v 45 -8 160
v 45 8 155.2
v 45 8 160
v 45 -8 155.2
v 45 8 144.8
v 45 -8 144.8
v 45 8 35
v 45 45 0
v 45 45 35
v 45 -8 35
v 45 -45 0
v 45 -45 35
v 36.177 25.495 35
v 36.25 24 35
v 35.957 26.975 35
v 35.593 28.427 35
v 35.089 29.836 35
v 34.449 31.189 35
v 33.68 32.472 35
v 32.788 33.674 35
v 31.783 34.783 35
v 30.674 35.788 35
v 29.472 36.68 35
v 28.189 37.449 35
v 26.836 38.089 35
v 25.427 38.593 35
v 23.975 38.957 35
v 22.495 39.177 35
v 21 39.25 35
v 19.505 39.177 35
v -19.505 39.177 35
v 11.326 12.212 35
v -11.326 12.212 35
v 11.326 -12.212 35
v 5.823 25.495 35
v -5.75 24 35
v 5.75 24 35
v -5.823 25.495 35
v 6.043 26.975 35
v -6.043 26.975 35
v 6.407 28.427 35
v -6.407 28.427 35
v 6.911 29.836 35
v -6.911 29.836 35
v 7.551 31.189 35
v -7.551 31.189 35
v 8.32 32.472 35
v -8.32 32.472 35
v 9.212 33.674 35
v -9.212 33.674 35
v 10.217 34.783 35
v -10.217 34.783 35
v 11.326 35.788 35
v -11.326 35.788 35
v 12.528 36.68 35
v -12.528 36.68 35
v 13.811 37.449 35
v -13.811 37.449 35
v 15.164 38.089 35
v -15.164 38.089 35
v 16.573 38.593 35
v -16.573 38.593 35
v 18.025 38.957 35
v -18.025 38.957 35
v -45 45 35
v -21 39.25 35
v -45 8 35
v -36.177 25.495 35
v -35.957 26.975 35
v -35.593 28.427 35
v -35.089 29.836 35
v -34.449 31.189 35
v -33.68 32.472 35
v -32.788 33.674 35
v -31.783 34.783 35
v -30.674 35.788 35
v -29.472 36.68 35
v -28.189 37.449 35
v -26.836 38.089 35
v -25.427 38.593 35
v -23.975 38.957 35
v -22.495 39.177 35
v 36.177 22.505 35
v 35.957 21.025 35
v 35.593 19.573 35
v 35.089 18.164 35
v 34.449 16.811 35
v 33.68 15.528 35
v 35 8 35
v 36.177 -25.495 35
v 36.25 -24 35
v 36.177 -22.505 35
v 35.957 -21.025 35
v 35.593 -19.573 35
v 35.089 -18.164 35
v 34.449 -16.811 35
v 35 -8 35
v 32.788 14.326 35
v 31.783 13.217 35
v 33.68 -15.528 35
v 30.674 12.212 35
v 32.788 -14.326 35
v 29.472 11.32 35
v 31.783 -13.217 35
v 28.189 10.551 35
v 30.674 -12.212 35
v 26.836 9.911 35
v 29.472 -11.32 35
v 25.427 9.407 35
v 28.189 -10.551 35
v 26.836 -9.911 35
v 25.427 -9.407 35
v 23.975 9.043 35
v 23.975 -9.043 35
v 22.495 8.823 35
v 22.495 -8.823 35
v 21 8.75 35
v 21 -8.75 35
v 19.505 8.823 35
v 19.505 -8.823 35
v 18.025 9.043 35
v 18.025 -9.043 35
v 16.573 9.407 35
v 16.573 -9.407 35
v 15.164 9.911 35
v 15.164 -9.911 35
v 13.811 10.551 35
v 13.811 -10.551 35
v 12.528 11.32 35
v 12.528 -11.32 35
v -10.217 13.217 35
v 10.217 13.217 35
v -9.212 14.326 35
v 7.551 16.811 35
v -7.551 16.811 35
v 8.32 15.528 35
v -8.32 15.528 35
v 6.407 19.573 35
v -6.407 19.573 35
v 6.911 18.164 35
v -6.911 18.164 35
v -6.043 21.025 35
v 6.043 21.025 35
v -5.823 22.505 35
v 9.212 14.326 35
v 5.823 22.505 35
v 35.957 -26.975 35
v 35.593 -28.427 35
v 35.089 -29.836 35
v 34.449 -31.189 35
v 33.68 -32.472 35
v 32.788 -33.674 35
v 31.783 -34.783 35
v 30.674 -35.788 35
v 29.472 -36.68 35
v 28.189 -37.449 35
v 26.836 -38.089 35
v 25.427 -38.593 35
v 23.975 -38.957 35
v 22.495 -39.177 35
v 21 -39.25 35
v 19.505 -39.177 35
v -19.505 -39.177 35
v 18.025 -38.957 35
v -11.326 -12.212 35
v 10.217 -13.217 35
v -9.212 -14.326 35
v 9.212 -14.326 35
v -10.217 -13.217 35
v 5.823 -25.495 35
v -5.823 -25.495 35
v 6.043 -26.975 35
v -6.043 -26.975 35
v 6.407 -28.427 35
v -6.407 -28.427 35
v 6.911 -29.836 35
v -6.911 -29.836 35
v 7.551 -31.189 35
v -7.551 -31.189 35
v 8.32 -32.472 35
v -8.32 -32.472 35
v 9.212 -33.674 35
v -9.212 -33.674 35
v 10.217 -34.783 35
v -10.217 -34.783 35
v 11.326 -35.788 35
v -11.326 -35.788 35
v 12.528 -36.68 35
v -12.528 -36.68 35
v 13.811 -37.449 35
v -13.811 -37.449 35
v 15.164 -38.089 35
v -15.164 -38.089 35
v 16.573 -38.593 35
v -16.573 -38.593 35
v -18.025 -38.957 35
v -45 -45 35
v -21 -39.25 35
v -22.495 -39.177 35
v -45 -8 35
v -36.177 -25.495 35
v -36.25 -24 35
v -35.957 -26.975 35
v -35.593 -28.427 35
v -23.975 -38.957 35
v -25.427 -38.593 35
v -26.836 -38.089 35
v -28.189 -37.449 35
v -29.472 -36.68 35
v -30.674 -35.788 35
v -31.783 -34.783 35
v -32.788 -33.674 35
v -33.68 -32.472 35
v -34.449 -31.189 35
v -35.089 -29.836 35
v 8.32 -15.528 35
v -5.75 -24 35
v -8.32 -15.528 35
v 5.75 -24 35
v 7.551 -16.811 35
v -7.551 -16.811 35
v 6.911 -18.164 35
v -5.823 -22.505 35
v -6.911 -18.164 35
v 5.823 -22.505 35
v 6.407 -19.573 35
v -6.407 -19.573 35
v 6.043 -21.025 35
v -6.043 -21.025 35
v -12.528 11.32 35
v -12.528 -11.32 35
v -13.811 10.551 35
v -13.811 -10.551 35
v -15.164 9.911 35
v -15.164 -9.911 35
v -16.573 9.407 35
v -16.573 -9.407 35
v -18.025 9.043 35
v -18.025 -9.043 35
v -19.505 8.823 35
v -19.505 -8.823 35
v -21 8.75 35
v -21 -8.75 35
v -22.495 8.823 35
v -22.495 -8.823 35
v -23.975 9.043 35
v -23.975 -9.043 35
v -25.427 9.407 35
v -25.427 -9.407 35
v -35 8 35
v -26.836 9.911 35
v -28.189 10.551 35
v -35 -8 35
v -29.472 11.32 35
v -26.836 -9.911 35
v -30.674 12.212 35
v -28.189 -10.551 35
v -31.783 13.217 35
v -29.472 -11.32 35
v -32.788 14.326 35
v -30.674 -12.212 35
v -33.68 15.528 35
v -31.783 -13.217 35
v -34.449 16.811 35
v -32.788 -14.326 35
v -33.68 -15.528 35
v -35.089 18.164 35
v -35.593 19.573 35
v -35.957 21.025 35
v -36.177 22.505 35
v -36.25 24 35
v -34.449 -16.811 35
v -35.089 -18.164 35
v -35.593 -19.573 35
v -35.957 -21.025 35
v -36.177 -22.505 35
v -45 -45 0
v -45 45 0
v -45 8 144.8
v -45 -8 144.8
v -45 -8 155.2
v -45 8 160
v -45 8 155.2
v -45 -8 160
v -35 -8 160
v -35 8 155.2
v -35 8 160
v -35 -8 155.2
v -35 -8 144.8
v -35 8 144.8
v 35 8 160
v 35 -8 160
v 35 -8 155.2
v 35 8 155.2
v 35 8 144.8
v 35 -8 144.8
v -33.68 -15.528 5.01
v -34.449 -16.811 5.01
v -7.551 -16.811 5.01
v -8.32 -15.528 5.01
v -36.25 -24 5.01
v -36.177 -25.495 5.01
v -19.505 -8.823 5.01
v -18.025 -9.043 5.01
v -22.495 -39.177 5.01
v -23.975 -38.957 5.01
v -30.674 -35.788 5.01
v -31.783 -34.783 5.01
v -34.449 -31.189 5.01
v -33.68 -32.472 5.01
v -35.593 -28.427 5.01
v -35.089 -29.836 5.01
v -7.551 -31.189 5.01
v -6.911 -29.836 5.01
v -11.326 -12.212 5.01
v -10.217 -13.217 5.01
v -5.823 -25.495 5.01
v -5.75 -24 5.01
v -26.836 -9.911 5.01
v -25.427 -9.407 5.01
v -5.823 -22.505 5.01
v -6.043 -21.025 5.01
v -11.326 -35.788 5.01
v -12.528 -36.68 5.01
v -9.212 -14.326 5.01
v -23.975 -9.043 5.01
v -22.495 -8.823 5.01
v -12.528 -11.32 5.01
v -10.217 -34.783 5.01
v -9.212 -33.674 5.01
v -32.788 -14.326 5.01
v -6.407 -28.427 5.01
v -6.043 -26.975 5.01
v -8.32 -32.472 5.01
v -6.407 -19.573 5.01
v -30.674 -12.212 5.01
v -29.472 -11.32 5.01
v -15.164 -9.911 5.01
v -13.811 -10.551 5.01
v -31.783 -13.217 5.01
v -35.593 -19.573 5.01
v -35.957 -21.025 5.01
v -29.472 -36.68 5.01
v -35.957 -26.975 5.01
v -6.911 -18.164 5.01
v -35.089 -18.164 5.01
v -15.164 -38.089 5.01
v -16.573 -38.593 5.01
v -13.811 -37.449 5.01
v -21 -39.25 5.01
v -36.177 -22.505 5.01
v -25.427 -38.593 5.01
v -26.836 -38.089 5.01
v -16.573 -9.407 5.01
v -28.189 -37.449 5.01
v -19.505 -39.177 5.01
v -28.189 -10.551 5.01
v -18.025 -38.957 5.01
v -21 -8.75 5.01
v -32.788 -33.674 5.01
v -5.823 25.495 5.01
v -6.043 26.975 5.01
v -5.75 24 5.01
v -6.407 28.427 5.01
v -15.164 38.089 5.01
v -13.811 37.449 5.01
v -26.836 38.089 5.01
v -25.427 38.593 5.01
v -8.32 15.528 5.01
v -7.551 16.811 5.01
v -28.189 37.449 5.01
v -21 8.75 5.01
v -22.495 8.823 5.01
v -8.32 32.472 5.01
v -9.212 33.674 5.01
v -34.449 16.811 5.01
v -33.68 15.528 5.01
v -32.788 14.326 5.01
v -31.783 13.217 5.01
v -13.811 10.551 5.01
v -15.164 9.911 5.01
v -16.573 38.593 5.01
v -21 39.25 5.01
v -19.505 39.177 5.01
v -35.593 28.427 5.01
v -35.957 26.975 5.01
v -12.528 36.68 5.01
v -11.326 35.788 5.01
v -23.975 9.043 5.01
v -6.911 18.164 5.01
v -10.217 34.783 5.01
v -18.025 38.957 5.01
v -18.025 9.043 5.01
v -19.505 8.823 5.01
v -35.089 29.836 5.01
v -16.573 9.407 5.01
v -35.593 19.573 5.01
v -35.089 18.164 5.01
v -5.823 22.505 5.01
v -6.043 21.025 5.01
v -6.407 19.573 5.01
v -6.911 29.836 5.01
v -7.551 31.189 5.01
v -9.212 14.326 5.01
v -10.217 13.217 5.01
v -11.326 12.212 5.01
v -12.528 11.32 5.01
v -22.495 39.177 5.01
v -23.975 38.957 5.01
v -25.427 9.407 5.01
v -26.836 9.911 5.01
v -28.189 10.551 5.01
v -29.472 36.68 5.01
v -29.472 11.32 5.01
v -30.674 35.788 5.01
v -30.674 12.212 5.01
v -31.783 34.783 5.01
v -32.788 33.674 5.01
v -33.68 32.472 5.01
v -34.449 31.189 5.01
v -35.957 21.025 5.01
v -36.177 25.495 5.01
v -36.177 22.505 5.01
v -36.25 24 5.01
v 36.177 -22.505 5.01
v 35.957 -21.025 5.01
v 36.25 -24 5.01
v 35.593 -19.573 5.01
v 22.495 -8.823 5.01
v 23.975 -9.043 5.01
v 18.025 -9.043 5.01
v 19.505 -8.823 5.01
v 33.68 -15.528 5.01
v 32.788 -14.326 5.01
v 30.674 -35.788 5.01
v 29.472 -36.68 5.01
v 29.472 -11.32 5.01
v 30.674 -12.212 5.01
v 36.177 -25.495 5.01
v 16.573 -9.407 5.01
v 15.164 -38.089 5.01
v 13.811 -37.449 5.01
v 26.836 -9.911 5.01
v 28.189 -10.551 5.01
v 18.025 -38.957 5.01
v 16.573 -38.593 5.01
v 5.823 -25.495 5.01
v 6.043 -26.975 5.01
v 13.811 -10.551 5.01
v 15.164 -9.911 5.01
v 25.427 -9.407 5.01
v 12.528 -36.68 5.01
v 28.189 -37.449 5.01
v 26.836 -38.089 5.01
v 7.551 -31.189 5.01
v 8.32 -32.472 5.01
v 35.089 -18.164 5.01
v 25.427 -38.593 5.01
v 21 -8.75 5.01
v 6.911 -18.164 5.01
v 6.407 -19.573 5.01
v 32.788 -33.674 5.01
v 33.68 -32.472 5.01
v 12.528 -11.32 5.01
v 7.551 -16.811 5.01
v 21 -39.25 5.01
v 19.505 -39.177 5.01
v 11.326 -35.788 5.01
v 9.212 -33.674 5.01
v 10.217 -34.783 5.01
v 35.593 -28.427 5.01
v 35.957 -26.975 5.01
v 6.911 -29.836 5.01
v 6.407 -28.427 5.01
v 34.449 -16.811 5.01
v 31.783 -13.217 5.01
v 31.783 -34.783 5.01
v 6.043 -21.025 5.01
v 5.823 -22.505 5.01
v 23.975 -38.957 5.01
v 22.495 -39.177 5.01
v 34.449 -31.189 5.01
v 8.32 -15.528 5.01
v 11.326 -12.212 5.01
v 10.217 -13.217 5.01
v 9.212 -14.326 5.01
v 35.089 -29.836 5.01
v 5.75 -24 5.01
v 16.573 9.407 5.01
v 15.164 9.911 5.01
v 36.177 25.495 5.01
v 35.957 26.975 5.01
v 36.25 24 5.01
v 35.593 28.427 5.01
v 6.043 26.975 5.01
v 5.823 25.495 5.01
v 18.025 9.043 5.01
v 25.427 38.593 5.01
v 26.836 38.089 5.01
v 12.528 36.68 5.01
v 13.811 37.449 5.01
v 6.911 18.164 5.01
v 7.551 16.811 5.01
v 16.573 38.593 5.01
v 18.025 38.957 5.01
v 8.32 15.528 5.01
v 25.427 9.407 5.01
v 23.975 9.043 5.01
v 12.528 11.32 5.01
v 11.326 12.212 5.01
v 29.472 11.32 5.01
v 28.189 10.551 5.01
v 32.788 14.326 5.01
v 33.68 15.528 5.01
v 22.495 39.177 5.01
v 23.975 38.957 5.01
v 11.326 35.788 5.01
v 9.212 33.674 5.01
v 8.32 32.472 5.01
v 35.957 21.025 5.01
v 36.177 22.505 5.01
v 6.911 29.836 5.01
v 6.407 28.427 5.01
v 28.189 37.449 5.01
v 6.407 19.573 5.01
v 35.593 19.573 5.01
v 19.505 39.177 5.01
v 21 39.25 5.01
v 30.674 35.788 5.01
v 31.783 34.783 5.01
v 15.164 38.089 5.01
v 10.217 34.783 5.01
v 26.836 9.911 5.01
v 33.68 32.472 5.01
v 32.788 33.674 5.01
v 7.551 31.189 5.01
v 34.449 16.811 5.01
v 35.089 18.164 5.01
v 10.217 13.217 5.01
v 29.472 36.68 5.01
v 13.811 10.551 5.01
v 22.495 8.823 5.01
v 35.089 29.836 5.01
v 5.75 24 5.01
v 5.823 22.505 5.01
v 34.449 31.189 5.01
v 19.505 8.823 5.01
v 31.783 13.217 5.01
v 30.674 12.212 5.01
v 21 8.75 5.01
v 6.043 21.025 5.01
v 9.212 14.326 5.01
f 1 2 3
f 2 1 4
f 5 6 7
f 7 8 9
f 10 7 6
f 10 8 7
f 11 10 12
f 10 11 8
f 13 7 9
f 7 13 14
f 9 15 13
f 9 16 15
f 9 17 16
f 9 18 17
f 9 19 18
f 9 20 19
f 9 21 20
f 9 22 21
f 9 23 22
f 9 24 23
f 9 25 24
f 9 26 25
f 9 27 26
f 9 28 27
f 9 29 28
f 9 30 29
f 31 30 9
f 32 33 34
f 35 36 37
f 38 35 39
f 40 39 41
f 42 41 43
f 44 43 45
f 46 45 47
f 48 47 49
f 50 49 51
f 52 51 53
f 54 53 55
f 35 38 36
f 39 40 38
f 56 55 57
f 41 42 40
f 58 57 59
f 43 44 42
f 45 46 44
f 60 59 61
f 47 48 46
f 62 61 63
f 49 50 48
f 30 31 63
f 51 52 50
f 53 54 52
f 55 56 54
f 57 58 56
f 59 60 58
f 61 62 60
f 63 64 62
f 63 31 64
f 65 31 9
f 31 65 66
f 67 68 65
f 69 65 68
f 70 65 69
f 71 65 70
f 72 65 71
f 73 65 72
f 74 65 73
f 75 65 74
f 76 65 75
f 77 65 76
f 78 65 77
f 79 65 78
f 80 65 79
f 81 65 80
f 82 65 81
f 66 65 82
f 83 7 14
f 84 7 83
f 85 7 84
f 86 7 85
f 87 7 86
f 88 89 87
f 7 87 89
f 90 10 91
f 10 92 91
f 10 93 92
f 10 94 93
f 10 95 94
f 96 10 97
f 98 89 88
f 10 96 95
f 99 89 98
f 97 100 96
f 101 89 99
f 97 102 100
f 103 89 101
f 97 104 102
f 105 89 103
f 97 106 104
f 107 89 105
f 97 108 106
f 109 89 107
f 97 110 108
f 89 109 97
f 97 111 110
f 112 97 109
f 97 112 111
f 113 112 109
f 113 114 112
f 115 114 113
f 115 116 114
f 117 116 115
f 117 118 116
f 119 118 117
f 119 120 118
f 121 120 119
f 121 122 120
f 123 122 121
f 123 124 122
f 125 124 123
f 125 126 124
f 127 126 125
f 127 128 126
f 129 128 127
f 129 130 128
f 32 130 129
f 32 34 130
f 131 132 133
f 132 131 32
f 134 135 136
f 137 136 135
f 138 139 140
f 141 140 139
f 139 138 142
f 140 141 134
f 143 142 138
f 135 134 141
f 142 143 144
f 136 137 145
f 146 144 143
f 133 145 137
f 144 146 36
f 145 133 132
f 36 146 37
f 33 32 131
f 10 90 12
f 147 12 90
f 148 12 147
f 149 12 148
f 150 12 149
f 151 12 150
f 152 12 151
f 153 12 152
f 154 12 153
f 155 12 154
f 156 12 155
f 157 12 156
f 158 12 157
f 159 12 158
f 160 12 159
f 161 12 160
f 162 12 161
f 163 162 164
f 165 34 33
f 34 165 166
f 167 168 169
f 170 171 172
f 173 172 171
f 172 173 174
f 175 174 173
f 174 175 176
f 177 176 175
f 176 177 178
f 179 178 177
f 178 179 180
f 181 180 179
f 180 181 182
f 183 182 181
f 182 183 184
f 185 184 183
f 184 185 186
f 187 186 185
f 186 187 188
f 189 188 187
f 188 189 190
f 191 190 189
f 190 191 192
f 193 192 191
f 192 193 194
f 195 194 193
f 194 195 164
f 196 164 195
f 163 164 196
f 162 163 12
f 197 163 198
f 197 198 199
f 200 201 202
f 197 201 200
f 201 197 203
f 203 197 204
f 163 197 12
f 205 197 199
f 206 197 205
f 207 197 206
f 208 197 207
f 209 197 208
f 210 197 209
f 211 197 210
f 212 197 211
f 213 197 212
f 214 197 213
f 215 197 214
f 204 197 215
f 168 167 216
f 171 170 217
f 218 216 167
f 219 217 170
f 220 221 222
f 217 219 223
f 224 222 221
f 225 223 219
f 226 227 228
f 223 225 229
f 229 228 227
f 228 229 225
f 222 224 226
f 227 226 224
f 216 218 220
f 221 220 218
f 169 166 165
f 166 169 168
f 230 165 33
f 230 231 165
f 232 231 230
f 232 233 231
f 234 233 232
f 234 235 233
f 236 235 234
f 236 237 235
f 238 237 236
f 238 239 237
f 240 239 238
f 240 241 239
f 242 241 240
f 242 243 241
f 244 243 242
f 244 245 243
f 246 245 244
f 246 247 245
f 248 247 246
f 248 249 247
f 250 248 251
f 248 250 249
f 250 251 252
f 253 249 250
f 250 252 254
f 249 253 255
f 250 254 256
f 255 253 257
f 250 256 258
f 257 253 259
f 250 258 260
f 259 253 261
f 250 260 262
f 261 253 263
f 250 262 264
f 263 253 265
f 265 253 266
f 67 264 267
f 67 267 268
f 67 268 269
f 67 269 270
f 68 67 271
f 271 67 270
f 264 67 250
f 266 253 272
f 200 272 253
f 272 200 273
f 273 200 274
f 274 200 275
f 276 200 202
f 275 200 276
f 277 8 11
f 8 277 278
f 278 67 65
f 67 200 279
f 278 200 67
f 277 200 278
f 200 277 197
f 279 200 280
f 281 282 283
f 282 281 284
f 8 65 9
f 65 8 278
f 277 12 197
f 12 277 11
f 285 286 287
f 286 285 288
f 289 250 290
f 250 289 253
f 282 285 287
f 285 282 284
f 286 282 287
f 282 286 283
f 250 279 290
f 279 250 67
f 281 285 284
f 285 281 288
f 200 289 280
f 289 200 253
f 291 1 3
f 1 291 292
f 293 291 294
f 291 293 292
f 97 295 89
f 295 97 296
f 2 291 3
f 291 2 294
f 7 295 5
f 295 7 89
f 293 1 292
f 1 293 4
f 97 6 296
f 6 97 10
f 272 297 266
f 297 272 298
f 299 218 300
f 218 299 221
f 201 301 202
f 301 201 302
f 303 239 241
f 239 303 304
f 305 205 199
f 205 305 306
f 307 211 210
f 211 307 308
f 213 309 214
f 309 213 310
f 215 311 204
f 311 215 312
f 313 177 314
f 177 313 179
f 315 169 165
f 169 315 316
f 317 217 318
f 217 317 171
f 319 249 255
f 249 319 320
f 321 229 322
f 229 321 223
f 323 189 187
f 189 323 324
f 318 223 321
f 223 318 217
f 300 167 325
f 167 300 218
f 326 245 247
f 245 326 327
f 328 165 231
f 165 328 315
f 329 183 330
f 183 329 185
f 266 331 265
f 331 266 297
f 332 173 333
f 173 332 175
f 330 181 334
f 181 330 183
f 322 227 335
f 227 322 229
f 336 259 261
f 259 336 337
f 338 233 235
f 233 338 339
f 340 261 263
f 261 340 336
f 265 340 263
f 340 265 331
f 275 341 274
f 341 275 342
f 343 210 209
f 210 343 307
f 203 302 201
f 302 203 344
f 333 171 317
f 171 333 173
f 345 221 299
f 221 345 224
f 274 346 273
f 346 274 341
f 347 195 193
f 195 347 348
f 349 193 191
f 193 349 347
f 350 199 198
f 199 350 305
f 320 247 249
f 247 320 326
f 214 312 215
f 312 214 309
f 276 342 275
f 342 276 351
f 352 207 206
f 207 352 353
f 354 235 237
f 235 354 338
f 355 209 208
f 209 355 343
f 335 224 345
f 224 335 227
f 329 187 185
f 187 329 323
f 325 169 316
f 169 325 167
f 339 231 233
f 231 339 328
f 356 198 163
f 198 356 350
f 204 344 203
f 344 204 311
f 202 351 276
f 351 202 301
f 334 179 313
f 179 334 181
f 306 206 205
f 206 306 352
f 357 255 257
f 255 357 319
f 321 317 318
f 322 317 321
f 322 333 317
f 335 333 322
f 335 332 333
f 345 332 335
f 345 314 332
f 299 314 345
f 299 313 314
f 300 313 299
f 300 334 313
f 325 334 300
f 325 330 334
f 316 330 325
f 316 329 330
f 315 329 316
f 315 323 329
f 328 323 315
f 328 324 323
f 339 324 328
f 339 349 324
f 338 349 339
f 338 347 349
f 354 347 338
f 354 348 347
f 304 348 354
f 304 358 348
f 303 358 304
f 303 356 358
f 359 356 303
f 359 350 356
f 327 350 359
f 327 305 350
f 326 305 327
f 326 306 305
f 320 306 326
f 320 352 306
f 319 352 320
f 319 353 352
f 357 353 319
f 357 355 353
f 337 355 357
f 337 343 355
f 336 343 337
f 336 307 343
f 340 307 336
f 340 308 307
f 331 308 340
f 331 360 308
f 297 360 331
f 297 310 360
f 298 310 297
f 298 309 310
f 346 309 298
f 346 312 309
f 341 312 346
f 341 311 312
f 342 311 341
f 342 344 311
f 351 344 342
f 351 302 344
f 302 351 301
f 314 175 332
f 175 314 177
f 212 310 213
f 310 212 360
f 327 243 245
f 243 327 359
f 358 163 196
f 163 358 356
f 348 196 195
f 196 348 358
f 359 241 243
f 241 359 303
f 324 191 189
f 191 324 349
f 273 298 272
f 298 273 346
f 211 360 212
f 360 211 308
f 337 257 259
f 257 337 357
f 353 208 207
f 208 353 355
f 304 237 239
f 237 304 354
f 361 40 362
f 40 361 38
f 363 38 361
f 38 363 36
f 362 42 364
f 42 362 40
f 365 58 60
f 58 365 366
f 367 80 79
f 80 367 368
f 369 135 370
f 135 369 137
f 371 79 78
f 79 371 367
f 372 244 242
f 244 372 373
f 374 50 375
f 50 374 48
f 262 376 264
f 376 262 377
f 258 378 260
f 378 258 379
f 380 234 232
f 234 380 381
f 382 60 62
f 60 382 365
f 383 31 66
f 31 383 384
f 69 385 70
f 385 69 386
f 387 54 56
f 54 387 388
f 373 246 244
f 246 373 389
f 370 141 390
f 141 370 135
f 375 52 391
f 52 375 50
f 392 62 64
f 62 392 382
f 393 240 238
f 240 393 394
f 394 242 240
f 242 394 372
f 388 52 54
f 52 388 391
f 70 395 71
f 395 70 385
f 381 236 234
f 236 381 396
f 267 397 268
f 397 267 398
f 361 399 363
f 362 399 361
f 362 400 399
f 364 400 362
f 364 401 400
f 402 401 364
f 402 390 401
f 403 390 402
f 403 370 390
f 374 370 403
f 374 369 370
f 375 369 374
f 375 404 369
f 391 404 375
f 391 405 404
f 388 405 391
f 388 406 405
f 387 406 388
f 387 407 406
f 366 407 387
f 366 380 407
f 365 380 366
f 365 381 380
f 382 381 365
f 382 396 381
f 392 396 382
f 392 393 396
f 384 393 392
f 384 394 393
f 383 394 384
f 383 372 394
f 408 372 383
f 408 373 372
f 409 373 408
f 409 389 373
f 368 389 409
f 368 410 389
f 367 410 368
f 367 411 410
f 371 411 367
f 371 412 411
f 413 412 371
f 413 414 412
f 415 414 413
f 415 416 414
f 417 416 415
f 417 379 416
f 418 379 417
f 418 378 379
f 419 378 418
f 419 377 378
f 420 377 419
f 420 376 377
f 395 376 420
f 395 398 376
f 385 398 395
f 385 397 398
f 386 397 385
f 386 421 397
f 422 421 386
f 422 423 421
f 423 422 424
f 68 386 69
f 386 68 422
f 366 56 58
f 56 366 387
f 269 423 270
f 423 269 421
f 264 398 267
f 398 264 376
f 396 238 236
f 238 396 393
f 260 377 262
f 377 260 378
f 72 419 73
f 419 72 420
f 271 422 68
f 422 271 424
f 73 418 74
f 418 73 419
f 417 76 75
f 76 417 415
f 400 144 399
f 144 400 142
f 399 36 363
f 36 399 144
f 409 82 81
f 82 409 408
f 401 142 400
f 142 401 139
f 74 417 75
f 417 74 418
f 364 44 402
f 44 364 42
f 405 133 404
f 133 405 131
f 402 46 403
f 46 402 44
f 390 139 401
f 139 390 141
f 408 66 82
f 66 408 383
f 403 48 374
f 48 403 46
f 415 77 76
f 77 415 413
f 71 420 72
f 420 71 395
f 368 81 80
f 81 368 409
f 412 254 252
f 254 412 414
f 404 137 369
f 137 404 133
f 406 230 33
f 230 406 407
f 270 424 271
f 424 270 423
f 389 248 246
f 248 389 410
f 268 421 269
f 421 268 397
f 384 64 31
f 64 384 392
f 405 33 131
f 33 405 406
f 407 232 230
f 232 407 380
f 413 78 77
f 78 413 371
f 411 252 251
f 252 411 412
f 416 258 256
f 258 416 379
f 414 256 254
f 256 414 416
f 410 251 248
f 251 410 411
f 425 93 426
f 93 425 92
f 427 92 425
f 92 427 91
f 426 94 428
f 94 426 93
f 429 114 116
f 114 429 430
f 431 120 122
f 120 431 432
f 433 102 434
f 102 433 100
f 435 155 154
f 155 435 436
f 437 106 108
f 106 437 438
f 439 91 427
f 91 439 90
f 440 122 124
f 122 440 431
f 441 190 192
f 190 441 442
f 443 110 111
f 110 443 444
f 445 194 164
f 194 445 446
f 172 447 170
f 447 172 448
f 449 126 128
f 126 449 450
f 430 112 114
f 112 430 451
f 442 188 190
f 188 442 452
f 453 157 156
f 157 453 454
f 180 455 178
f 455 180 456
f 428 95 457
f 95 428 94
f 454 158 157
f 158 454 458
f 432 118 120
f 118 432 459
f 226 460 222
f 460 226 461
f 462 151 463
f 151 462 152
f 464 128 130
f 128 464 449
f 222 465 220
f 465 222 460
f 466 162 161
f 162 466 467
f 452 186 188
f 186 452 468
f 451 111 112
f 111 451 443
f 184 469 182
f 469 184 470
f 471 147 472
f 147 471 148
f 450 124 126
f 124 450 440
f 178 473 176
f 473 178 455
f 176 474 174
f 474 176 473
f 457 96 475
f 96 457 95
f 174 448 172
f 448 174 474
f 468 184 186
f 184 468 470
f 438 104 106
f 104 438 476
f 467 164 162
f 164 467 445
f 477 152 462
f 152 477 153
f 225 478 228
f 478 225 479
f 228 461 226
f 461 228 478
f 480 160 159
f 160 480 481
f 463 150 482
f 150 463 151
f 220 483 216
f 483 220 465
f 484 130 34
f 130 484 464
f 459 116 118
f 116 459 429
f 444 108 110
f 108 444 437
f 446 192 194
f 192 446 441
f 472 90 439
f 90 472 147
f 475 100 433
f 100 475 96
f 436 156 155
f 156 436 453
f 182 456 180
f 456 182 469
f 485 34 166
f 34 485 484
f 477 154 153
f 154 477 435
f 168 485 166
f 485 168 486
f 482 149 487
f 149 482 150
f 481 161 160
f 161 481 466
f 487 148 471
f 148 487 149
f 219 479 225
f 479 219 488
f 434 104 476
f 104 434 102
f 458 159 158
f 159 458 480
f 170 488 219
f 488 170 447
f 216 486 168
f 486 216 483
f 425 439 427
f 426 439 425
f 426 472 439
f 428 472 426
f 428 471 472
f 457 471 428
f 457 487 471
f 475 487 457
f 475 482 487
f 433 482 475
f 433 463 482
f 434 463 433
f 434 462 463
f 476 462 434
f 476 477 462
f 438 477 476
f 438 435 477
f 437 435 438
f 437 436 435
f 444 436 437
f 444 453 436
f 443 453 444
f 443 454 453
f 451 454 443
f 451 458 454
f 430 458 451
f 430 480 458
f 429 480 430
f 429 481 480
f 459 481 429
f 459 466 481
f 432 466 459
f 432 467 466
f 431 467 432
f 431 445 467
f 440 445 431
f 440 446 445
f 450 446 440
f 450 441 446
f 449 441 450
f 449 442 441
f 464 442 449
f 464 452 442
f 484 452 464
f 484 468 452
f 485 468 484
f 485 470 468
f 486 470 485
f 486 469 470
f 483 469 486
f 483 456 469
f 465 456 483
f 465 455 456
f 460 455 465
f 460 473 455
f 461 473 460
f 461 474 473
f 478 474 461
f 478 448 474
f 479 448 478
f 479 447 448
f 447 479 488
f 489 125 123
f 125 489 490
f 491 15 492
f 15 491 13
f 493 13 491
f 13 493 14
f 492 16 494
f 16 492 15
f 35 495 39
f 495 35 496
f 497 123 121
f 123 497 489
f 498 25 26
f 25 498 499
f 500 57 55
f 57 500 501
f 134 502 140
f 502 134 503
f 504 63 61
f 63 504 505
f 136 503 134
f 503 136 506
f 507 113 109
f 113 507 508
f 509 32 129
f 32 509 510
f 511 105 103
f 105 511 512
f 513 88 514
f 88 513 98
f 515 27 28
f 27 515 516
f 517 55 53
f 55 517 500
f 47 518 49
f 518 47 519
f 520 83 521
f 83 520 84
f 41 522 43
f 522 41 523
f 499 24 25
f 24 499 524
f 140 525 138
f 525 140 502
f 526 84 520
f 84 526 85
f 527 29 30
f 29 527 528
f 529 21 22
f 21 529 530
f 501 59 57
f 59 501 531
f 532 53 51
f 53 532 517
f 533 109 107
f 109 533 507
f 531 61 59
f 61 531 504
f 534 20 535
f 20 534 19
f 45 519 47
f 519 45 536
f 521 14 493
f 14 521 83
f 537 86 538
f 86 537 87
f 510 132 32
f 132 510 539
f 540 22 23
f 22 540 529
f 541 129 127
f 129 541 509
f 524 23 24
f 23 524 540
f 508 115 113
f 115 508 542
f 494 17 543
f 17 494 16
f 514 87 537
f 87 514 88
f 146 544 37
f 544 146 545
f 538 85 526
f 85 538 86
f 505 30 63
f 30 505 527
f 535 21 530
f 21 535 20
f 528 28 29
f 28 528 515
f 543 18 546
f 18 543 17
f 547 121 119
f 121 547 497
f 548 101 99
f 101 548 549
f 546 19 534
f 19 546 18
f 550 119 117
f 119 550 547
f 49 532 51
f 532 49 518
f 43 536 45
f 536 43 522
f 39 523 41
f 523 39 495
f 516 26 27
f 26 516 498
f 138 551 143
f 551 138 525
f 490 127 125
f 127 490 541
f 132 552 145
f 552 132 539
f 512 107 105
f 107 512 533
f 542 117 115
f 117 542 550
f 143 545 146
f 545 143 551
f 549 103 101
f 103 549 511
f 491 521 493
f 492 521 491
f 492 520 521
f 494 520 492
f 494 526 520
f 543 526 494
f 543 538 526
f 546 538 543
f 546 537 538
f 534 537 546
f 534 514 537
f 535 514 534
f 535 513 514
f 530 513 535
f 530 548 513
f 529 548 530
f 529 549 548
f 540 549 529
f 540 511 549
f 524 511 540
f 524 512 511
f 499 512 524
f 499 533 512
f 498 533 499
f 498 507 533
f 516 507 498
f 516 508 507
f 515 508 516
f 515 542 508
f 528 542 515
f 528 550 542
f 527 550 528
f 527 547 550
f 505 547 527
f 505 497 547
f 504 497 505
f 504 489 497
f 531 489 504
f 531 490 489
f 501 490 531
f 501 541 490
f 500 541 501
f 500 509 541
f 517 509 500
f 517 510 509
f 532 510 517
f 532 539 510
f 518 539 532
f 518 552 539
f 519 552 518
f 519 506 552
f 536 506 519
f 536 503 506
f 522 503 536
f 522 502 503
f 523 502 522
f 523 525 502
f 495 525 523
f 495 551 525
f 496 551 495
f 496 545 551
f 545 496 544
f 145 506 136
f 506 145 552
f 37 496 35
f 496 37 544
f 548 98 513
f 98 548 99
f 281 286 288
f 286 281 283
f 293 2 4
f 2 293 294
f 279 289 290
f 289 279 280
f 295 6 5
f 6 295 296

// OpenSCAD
// Part 1: Base Block with tube seats and posts
// Part 2: Handle Bar

// --- Dimensions Part 1 ---
base_x      = 90.0;    // Base length (X)
base_y      = 90.0;    // Base width (Y)
base_z      = 35.0;    // Base height (Z)

seat_d      = 30.5;    // Diameter of tube seats
seat_depth  = 30.0;    // Depth of tube seats
seat_floor  = 5.0;     // Remaining floor thickness

seat_x_pos  = 21.0;    // X offset for seats
seat_y_pos  = 24.0;    // Y offset for seats

post_x_thick = 10.0;   // Thickness of posts (X direction)
post_y_wide  = 16.0;   // Width of posts (Y direction)
post_z_high  = 160.0;  // Total height of posts (Z)

hole_size   = 10.4;    // Square hole size (X-axis through posts)
hole_z_pos  = 150.0;   // Z height of the hole center

// --- Dimensions Part 2 ---
handle_x    = 100.0;   // Length of handle (X)
handle_y    = 10.0;    // Width of handle (Y)
handle_z    = 10.0;    // Height of handle (Z)
handle_y_gap = 10.0;   // Gap between base +Y face and handle (Y direction)

// Calculated positions
handle_y_start = (base_y / 2) + handle_y_gap;

$fn = 64;

// --- MODULE: PART 1 ---
module part_1() {
    difference() {
        // The main body (Base + Posts)
        union() {
            // Main Base Block
            translate([-base_x/2, -base_y/2, 0])
                cube([base_x, base_y, base_z]);
            
            // Post 1 (at -X end, flush with end face)
            // End face is at -45. Post thickness 10. Post goes from -45 to -35.
            translate([-base_x/2, -post_y_wide/2, base_z])
                cube([post_x_thick, post_y_wide, post_z_high - base_z]);
            
            // Post 2 (at +X end, flush with end face)
            // End face is at 45. Post thickness 10. Post goes from 35 to 45.
            translate([base_x/2 - post_x_thick, -post_y_wide/2, base_z])
                cube([post_x_thick, post_y_wide, post_z_high - base_z]);
        }

        // Tube Seats (Blind holes)
        for (sx = [-seat_x_pos, seat_x_pos]) {
            for (sy = [-seat_y_pos, seat_y_pos]) {
                // Subtracting from the base. 
                // We place the cylinder so it cuts into the base from the top.
                translate([sx, sy, base_z - seat_depth + 0.01])
                    cylinder(h = seat_depth, d = seat_d);
            }
        }

        // Square holes through posts
        // The hole is centered at hole_z_pos and goes through the posts along X.
        // We create a cube that is wider than the posts to ensure a clean cut.
        // The posts are located at X = [-45, -35] and X = [35, 45].
        // To cut through both, we can use two separate cubes or one long one.
        // A single long one is safer for the boolean operation.
        translate([-base_x/2 - 1, -post_y_wide/2 - 1, hole_z_pos - hole_size/2])
            cube([base_x + 2, post_y_wide + 2, hole_size]);
    }
}

// --- MODULE: PART 2 ---
module part_2() {
    // Handle is a square bar 10x10, 100 long, centered on X.
    // Spans Y from 55 to 65.
    translate([-handle_x/2, handle_y_start, 0])
        cube([handle_x, handle_y, handle_z]);
}

// --- RENDERING ---
// To view Part 1:
part_1();

// To view Part 2 (uncomment below and comment part_1 above to see separately):
// translate([0, 100, 0]) part_2();
